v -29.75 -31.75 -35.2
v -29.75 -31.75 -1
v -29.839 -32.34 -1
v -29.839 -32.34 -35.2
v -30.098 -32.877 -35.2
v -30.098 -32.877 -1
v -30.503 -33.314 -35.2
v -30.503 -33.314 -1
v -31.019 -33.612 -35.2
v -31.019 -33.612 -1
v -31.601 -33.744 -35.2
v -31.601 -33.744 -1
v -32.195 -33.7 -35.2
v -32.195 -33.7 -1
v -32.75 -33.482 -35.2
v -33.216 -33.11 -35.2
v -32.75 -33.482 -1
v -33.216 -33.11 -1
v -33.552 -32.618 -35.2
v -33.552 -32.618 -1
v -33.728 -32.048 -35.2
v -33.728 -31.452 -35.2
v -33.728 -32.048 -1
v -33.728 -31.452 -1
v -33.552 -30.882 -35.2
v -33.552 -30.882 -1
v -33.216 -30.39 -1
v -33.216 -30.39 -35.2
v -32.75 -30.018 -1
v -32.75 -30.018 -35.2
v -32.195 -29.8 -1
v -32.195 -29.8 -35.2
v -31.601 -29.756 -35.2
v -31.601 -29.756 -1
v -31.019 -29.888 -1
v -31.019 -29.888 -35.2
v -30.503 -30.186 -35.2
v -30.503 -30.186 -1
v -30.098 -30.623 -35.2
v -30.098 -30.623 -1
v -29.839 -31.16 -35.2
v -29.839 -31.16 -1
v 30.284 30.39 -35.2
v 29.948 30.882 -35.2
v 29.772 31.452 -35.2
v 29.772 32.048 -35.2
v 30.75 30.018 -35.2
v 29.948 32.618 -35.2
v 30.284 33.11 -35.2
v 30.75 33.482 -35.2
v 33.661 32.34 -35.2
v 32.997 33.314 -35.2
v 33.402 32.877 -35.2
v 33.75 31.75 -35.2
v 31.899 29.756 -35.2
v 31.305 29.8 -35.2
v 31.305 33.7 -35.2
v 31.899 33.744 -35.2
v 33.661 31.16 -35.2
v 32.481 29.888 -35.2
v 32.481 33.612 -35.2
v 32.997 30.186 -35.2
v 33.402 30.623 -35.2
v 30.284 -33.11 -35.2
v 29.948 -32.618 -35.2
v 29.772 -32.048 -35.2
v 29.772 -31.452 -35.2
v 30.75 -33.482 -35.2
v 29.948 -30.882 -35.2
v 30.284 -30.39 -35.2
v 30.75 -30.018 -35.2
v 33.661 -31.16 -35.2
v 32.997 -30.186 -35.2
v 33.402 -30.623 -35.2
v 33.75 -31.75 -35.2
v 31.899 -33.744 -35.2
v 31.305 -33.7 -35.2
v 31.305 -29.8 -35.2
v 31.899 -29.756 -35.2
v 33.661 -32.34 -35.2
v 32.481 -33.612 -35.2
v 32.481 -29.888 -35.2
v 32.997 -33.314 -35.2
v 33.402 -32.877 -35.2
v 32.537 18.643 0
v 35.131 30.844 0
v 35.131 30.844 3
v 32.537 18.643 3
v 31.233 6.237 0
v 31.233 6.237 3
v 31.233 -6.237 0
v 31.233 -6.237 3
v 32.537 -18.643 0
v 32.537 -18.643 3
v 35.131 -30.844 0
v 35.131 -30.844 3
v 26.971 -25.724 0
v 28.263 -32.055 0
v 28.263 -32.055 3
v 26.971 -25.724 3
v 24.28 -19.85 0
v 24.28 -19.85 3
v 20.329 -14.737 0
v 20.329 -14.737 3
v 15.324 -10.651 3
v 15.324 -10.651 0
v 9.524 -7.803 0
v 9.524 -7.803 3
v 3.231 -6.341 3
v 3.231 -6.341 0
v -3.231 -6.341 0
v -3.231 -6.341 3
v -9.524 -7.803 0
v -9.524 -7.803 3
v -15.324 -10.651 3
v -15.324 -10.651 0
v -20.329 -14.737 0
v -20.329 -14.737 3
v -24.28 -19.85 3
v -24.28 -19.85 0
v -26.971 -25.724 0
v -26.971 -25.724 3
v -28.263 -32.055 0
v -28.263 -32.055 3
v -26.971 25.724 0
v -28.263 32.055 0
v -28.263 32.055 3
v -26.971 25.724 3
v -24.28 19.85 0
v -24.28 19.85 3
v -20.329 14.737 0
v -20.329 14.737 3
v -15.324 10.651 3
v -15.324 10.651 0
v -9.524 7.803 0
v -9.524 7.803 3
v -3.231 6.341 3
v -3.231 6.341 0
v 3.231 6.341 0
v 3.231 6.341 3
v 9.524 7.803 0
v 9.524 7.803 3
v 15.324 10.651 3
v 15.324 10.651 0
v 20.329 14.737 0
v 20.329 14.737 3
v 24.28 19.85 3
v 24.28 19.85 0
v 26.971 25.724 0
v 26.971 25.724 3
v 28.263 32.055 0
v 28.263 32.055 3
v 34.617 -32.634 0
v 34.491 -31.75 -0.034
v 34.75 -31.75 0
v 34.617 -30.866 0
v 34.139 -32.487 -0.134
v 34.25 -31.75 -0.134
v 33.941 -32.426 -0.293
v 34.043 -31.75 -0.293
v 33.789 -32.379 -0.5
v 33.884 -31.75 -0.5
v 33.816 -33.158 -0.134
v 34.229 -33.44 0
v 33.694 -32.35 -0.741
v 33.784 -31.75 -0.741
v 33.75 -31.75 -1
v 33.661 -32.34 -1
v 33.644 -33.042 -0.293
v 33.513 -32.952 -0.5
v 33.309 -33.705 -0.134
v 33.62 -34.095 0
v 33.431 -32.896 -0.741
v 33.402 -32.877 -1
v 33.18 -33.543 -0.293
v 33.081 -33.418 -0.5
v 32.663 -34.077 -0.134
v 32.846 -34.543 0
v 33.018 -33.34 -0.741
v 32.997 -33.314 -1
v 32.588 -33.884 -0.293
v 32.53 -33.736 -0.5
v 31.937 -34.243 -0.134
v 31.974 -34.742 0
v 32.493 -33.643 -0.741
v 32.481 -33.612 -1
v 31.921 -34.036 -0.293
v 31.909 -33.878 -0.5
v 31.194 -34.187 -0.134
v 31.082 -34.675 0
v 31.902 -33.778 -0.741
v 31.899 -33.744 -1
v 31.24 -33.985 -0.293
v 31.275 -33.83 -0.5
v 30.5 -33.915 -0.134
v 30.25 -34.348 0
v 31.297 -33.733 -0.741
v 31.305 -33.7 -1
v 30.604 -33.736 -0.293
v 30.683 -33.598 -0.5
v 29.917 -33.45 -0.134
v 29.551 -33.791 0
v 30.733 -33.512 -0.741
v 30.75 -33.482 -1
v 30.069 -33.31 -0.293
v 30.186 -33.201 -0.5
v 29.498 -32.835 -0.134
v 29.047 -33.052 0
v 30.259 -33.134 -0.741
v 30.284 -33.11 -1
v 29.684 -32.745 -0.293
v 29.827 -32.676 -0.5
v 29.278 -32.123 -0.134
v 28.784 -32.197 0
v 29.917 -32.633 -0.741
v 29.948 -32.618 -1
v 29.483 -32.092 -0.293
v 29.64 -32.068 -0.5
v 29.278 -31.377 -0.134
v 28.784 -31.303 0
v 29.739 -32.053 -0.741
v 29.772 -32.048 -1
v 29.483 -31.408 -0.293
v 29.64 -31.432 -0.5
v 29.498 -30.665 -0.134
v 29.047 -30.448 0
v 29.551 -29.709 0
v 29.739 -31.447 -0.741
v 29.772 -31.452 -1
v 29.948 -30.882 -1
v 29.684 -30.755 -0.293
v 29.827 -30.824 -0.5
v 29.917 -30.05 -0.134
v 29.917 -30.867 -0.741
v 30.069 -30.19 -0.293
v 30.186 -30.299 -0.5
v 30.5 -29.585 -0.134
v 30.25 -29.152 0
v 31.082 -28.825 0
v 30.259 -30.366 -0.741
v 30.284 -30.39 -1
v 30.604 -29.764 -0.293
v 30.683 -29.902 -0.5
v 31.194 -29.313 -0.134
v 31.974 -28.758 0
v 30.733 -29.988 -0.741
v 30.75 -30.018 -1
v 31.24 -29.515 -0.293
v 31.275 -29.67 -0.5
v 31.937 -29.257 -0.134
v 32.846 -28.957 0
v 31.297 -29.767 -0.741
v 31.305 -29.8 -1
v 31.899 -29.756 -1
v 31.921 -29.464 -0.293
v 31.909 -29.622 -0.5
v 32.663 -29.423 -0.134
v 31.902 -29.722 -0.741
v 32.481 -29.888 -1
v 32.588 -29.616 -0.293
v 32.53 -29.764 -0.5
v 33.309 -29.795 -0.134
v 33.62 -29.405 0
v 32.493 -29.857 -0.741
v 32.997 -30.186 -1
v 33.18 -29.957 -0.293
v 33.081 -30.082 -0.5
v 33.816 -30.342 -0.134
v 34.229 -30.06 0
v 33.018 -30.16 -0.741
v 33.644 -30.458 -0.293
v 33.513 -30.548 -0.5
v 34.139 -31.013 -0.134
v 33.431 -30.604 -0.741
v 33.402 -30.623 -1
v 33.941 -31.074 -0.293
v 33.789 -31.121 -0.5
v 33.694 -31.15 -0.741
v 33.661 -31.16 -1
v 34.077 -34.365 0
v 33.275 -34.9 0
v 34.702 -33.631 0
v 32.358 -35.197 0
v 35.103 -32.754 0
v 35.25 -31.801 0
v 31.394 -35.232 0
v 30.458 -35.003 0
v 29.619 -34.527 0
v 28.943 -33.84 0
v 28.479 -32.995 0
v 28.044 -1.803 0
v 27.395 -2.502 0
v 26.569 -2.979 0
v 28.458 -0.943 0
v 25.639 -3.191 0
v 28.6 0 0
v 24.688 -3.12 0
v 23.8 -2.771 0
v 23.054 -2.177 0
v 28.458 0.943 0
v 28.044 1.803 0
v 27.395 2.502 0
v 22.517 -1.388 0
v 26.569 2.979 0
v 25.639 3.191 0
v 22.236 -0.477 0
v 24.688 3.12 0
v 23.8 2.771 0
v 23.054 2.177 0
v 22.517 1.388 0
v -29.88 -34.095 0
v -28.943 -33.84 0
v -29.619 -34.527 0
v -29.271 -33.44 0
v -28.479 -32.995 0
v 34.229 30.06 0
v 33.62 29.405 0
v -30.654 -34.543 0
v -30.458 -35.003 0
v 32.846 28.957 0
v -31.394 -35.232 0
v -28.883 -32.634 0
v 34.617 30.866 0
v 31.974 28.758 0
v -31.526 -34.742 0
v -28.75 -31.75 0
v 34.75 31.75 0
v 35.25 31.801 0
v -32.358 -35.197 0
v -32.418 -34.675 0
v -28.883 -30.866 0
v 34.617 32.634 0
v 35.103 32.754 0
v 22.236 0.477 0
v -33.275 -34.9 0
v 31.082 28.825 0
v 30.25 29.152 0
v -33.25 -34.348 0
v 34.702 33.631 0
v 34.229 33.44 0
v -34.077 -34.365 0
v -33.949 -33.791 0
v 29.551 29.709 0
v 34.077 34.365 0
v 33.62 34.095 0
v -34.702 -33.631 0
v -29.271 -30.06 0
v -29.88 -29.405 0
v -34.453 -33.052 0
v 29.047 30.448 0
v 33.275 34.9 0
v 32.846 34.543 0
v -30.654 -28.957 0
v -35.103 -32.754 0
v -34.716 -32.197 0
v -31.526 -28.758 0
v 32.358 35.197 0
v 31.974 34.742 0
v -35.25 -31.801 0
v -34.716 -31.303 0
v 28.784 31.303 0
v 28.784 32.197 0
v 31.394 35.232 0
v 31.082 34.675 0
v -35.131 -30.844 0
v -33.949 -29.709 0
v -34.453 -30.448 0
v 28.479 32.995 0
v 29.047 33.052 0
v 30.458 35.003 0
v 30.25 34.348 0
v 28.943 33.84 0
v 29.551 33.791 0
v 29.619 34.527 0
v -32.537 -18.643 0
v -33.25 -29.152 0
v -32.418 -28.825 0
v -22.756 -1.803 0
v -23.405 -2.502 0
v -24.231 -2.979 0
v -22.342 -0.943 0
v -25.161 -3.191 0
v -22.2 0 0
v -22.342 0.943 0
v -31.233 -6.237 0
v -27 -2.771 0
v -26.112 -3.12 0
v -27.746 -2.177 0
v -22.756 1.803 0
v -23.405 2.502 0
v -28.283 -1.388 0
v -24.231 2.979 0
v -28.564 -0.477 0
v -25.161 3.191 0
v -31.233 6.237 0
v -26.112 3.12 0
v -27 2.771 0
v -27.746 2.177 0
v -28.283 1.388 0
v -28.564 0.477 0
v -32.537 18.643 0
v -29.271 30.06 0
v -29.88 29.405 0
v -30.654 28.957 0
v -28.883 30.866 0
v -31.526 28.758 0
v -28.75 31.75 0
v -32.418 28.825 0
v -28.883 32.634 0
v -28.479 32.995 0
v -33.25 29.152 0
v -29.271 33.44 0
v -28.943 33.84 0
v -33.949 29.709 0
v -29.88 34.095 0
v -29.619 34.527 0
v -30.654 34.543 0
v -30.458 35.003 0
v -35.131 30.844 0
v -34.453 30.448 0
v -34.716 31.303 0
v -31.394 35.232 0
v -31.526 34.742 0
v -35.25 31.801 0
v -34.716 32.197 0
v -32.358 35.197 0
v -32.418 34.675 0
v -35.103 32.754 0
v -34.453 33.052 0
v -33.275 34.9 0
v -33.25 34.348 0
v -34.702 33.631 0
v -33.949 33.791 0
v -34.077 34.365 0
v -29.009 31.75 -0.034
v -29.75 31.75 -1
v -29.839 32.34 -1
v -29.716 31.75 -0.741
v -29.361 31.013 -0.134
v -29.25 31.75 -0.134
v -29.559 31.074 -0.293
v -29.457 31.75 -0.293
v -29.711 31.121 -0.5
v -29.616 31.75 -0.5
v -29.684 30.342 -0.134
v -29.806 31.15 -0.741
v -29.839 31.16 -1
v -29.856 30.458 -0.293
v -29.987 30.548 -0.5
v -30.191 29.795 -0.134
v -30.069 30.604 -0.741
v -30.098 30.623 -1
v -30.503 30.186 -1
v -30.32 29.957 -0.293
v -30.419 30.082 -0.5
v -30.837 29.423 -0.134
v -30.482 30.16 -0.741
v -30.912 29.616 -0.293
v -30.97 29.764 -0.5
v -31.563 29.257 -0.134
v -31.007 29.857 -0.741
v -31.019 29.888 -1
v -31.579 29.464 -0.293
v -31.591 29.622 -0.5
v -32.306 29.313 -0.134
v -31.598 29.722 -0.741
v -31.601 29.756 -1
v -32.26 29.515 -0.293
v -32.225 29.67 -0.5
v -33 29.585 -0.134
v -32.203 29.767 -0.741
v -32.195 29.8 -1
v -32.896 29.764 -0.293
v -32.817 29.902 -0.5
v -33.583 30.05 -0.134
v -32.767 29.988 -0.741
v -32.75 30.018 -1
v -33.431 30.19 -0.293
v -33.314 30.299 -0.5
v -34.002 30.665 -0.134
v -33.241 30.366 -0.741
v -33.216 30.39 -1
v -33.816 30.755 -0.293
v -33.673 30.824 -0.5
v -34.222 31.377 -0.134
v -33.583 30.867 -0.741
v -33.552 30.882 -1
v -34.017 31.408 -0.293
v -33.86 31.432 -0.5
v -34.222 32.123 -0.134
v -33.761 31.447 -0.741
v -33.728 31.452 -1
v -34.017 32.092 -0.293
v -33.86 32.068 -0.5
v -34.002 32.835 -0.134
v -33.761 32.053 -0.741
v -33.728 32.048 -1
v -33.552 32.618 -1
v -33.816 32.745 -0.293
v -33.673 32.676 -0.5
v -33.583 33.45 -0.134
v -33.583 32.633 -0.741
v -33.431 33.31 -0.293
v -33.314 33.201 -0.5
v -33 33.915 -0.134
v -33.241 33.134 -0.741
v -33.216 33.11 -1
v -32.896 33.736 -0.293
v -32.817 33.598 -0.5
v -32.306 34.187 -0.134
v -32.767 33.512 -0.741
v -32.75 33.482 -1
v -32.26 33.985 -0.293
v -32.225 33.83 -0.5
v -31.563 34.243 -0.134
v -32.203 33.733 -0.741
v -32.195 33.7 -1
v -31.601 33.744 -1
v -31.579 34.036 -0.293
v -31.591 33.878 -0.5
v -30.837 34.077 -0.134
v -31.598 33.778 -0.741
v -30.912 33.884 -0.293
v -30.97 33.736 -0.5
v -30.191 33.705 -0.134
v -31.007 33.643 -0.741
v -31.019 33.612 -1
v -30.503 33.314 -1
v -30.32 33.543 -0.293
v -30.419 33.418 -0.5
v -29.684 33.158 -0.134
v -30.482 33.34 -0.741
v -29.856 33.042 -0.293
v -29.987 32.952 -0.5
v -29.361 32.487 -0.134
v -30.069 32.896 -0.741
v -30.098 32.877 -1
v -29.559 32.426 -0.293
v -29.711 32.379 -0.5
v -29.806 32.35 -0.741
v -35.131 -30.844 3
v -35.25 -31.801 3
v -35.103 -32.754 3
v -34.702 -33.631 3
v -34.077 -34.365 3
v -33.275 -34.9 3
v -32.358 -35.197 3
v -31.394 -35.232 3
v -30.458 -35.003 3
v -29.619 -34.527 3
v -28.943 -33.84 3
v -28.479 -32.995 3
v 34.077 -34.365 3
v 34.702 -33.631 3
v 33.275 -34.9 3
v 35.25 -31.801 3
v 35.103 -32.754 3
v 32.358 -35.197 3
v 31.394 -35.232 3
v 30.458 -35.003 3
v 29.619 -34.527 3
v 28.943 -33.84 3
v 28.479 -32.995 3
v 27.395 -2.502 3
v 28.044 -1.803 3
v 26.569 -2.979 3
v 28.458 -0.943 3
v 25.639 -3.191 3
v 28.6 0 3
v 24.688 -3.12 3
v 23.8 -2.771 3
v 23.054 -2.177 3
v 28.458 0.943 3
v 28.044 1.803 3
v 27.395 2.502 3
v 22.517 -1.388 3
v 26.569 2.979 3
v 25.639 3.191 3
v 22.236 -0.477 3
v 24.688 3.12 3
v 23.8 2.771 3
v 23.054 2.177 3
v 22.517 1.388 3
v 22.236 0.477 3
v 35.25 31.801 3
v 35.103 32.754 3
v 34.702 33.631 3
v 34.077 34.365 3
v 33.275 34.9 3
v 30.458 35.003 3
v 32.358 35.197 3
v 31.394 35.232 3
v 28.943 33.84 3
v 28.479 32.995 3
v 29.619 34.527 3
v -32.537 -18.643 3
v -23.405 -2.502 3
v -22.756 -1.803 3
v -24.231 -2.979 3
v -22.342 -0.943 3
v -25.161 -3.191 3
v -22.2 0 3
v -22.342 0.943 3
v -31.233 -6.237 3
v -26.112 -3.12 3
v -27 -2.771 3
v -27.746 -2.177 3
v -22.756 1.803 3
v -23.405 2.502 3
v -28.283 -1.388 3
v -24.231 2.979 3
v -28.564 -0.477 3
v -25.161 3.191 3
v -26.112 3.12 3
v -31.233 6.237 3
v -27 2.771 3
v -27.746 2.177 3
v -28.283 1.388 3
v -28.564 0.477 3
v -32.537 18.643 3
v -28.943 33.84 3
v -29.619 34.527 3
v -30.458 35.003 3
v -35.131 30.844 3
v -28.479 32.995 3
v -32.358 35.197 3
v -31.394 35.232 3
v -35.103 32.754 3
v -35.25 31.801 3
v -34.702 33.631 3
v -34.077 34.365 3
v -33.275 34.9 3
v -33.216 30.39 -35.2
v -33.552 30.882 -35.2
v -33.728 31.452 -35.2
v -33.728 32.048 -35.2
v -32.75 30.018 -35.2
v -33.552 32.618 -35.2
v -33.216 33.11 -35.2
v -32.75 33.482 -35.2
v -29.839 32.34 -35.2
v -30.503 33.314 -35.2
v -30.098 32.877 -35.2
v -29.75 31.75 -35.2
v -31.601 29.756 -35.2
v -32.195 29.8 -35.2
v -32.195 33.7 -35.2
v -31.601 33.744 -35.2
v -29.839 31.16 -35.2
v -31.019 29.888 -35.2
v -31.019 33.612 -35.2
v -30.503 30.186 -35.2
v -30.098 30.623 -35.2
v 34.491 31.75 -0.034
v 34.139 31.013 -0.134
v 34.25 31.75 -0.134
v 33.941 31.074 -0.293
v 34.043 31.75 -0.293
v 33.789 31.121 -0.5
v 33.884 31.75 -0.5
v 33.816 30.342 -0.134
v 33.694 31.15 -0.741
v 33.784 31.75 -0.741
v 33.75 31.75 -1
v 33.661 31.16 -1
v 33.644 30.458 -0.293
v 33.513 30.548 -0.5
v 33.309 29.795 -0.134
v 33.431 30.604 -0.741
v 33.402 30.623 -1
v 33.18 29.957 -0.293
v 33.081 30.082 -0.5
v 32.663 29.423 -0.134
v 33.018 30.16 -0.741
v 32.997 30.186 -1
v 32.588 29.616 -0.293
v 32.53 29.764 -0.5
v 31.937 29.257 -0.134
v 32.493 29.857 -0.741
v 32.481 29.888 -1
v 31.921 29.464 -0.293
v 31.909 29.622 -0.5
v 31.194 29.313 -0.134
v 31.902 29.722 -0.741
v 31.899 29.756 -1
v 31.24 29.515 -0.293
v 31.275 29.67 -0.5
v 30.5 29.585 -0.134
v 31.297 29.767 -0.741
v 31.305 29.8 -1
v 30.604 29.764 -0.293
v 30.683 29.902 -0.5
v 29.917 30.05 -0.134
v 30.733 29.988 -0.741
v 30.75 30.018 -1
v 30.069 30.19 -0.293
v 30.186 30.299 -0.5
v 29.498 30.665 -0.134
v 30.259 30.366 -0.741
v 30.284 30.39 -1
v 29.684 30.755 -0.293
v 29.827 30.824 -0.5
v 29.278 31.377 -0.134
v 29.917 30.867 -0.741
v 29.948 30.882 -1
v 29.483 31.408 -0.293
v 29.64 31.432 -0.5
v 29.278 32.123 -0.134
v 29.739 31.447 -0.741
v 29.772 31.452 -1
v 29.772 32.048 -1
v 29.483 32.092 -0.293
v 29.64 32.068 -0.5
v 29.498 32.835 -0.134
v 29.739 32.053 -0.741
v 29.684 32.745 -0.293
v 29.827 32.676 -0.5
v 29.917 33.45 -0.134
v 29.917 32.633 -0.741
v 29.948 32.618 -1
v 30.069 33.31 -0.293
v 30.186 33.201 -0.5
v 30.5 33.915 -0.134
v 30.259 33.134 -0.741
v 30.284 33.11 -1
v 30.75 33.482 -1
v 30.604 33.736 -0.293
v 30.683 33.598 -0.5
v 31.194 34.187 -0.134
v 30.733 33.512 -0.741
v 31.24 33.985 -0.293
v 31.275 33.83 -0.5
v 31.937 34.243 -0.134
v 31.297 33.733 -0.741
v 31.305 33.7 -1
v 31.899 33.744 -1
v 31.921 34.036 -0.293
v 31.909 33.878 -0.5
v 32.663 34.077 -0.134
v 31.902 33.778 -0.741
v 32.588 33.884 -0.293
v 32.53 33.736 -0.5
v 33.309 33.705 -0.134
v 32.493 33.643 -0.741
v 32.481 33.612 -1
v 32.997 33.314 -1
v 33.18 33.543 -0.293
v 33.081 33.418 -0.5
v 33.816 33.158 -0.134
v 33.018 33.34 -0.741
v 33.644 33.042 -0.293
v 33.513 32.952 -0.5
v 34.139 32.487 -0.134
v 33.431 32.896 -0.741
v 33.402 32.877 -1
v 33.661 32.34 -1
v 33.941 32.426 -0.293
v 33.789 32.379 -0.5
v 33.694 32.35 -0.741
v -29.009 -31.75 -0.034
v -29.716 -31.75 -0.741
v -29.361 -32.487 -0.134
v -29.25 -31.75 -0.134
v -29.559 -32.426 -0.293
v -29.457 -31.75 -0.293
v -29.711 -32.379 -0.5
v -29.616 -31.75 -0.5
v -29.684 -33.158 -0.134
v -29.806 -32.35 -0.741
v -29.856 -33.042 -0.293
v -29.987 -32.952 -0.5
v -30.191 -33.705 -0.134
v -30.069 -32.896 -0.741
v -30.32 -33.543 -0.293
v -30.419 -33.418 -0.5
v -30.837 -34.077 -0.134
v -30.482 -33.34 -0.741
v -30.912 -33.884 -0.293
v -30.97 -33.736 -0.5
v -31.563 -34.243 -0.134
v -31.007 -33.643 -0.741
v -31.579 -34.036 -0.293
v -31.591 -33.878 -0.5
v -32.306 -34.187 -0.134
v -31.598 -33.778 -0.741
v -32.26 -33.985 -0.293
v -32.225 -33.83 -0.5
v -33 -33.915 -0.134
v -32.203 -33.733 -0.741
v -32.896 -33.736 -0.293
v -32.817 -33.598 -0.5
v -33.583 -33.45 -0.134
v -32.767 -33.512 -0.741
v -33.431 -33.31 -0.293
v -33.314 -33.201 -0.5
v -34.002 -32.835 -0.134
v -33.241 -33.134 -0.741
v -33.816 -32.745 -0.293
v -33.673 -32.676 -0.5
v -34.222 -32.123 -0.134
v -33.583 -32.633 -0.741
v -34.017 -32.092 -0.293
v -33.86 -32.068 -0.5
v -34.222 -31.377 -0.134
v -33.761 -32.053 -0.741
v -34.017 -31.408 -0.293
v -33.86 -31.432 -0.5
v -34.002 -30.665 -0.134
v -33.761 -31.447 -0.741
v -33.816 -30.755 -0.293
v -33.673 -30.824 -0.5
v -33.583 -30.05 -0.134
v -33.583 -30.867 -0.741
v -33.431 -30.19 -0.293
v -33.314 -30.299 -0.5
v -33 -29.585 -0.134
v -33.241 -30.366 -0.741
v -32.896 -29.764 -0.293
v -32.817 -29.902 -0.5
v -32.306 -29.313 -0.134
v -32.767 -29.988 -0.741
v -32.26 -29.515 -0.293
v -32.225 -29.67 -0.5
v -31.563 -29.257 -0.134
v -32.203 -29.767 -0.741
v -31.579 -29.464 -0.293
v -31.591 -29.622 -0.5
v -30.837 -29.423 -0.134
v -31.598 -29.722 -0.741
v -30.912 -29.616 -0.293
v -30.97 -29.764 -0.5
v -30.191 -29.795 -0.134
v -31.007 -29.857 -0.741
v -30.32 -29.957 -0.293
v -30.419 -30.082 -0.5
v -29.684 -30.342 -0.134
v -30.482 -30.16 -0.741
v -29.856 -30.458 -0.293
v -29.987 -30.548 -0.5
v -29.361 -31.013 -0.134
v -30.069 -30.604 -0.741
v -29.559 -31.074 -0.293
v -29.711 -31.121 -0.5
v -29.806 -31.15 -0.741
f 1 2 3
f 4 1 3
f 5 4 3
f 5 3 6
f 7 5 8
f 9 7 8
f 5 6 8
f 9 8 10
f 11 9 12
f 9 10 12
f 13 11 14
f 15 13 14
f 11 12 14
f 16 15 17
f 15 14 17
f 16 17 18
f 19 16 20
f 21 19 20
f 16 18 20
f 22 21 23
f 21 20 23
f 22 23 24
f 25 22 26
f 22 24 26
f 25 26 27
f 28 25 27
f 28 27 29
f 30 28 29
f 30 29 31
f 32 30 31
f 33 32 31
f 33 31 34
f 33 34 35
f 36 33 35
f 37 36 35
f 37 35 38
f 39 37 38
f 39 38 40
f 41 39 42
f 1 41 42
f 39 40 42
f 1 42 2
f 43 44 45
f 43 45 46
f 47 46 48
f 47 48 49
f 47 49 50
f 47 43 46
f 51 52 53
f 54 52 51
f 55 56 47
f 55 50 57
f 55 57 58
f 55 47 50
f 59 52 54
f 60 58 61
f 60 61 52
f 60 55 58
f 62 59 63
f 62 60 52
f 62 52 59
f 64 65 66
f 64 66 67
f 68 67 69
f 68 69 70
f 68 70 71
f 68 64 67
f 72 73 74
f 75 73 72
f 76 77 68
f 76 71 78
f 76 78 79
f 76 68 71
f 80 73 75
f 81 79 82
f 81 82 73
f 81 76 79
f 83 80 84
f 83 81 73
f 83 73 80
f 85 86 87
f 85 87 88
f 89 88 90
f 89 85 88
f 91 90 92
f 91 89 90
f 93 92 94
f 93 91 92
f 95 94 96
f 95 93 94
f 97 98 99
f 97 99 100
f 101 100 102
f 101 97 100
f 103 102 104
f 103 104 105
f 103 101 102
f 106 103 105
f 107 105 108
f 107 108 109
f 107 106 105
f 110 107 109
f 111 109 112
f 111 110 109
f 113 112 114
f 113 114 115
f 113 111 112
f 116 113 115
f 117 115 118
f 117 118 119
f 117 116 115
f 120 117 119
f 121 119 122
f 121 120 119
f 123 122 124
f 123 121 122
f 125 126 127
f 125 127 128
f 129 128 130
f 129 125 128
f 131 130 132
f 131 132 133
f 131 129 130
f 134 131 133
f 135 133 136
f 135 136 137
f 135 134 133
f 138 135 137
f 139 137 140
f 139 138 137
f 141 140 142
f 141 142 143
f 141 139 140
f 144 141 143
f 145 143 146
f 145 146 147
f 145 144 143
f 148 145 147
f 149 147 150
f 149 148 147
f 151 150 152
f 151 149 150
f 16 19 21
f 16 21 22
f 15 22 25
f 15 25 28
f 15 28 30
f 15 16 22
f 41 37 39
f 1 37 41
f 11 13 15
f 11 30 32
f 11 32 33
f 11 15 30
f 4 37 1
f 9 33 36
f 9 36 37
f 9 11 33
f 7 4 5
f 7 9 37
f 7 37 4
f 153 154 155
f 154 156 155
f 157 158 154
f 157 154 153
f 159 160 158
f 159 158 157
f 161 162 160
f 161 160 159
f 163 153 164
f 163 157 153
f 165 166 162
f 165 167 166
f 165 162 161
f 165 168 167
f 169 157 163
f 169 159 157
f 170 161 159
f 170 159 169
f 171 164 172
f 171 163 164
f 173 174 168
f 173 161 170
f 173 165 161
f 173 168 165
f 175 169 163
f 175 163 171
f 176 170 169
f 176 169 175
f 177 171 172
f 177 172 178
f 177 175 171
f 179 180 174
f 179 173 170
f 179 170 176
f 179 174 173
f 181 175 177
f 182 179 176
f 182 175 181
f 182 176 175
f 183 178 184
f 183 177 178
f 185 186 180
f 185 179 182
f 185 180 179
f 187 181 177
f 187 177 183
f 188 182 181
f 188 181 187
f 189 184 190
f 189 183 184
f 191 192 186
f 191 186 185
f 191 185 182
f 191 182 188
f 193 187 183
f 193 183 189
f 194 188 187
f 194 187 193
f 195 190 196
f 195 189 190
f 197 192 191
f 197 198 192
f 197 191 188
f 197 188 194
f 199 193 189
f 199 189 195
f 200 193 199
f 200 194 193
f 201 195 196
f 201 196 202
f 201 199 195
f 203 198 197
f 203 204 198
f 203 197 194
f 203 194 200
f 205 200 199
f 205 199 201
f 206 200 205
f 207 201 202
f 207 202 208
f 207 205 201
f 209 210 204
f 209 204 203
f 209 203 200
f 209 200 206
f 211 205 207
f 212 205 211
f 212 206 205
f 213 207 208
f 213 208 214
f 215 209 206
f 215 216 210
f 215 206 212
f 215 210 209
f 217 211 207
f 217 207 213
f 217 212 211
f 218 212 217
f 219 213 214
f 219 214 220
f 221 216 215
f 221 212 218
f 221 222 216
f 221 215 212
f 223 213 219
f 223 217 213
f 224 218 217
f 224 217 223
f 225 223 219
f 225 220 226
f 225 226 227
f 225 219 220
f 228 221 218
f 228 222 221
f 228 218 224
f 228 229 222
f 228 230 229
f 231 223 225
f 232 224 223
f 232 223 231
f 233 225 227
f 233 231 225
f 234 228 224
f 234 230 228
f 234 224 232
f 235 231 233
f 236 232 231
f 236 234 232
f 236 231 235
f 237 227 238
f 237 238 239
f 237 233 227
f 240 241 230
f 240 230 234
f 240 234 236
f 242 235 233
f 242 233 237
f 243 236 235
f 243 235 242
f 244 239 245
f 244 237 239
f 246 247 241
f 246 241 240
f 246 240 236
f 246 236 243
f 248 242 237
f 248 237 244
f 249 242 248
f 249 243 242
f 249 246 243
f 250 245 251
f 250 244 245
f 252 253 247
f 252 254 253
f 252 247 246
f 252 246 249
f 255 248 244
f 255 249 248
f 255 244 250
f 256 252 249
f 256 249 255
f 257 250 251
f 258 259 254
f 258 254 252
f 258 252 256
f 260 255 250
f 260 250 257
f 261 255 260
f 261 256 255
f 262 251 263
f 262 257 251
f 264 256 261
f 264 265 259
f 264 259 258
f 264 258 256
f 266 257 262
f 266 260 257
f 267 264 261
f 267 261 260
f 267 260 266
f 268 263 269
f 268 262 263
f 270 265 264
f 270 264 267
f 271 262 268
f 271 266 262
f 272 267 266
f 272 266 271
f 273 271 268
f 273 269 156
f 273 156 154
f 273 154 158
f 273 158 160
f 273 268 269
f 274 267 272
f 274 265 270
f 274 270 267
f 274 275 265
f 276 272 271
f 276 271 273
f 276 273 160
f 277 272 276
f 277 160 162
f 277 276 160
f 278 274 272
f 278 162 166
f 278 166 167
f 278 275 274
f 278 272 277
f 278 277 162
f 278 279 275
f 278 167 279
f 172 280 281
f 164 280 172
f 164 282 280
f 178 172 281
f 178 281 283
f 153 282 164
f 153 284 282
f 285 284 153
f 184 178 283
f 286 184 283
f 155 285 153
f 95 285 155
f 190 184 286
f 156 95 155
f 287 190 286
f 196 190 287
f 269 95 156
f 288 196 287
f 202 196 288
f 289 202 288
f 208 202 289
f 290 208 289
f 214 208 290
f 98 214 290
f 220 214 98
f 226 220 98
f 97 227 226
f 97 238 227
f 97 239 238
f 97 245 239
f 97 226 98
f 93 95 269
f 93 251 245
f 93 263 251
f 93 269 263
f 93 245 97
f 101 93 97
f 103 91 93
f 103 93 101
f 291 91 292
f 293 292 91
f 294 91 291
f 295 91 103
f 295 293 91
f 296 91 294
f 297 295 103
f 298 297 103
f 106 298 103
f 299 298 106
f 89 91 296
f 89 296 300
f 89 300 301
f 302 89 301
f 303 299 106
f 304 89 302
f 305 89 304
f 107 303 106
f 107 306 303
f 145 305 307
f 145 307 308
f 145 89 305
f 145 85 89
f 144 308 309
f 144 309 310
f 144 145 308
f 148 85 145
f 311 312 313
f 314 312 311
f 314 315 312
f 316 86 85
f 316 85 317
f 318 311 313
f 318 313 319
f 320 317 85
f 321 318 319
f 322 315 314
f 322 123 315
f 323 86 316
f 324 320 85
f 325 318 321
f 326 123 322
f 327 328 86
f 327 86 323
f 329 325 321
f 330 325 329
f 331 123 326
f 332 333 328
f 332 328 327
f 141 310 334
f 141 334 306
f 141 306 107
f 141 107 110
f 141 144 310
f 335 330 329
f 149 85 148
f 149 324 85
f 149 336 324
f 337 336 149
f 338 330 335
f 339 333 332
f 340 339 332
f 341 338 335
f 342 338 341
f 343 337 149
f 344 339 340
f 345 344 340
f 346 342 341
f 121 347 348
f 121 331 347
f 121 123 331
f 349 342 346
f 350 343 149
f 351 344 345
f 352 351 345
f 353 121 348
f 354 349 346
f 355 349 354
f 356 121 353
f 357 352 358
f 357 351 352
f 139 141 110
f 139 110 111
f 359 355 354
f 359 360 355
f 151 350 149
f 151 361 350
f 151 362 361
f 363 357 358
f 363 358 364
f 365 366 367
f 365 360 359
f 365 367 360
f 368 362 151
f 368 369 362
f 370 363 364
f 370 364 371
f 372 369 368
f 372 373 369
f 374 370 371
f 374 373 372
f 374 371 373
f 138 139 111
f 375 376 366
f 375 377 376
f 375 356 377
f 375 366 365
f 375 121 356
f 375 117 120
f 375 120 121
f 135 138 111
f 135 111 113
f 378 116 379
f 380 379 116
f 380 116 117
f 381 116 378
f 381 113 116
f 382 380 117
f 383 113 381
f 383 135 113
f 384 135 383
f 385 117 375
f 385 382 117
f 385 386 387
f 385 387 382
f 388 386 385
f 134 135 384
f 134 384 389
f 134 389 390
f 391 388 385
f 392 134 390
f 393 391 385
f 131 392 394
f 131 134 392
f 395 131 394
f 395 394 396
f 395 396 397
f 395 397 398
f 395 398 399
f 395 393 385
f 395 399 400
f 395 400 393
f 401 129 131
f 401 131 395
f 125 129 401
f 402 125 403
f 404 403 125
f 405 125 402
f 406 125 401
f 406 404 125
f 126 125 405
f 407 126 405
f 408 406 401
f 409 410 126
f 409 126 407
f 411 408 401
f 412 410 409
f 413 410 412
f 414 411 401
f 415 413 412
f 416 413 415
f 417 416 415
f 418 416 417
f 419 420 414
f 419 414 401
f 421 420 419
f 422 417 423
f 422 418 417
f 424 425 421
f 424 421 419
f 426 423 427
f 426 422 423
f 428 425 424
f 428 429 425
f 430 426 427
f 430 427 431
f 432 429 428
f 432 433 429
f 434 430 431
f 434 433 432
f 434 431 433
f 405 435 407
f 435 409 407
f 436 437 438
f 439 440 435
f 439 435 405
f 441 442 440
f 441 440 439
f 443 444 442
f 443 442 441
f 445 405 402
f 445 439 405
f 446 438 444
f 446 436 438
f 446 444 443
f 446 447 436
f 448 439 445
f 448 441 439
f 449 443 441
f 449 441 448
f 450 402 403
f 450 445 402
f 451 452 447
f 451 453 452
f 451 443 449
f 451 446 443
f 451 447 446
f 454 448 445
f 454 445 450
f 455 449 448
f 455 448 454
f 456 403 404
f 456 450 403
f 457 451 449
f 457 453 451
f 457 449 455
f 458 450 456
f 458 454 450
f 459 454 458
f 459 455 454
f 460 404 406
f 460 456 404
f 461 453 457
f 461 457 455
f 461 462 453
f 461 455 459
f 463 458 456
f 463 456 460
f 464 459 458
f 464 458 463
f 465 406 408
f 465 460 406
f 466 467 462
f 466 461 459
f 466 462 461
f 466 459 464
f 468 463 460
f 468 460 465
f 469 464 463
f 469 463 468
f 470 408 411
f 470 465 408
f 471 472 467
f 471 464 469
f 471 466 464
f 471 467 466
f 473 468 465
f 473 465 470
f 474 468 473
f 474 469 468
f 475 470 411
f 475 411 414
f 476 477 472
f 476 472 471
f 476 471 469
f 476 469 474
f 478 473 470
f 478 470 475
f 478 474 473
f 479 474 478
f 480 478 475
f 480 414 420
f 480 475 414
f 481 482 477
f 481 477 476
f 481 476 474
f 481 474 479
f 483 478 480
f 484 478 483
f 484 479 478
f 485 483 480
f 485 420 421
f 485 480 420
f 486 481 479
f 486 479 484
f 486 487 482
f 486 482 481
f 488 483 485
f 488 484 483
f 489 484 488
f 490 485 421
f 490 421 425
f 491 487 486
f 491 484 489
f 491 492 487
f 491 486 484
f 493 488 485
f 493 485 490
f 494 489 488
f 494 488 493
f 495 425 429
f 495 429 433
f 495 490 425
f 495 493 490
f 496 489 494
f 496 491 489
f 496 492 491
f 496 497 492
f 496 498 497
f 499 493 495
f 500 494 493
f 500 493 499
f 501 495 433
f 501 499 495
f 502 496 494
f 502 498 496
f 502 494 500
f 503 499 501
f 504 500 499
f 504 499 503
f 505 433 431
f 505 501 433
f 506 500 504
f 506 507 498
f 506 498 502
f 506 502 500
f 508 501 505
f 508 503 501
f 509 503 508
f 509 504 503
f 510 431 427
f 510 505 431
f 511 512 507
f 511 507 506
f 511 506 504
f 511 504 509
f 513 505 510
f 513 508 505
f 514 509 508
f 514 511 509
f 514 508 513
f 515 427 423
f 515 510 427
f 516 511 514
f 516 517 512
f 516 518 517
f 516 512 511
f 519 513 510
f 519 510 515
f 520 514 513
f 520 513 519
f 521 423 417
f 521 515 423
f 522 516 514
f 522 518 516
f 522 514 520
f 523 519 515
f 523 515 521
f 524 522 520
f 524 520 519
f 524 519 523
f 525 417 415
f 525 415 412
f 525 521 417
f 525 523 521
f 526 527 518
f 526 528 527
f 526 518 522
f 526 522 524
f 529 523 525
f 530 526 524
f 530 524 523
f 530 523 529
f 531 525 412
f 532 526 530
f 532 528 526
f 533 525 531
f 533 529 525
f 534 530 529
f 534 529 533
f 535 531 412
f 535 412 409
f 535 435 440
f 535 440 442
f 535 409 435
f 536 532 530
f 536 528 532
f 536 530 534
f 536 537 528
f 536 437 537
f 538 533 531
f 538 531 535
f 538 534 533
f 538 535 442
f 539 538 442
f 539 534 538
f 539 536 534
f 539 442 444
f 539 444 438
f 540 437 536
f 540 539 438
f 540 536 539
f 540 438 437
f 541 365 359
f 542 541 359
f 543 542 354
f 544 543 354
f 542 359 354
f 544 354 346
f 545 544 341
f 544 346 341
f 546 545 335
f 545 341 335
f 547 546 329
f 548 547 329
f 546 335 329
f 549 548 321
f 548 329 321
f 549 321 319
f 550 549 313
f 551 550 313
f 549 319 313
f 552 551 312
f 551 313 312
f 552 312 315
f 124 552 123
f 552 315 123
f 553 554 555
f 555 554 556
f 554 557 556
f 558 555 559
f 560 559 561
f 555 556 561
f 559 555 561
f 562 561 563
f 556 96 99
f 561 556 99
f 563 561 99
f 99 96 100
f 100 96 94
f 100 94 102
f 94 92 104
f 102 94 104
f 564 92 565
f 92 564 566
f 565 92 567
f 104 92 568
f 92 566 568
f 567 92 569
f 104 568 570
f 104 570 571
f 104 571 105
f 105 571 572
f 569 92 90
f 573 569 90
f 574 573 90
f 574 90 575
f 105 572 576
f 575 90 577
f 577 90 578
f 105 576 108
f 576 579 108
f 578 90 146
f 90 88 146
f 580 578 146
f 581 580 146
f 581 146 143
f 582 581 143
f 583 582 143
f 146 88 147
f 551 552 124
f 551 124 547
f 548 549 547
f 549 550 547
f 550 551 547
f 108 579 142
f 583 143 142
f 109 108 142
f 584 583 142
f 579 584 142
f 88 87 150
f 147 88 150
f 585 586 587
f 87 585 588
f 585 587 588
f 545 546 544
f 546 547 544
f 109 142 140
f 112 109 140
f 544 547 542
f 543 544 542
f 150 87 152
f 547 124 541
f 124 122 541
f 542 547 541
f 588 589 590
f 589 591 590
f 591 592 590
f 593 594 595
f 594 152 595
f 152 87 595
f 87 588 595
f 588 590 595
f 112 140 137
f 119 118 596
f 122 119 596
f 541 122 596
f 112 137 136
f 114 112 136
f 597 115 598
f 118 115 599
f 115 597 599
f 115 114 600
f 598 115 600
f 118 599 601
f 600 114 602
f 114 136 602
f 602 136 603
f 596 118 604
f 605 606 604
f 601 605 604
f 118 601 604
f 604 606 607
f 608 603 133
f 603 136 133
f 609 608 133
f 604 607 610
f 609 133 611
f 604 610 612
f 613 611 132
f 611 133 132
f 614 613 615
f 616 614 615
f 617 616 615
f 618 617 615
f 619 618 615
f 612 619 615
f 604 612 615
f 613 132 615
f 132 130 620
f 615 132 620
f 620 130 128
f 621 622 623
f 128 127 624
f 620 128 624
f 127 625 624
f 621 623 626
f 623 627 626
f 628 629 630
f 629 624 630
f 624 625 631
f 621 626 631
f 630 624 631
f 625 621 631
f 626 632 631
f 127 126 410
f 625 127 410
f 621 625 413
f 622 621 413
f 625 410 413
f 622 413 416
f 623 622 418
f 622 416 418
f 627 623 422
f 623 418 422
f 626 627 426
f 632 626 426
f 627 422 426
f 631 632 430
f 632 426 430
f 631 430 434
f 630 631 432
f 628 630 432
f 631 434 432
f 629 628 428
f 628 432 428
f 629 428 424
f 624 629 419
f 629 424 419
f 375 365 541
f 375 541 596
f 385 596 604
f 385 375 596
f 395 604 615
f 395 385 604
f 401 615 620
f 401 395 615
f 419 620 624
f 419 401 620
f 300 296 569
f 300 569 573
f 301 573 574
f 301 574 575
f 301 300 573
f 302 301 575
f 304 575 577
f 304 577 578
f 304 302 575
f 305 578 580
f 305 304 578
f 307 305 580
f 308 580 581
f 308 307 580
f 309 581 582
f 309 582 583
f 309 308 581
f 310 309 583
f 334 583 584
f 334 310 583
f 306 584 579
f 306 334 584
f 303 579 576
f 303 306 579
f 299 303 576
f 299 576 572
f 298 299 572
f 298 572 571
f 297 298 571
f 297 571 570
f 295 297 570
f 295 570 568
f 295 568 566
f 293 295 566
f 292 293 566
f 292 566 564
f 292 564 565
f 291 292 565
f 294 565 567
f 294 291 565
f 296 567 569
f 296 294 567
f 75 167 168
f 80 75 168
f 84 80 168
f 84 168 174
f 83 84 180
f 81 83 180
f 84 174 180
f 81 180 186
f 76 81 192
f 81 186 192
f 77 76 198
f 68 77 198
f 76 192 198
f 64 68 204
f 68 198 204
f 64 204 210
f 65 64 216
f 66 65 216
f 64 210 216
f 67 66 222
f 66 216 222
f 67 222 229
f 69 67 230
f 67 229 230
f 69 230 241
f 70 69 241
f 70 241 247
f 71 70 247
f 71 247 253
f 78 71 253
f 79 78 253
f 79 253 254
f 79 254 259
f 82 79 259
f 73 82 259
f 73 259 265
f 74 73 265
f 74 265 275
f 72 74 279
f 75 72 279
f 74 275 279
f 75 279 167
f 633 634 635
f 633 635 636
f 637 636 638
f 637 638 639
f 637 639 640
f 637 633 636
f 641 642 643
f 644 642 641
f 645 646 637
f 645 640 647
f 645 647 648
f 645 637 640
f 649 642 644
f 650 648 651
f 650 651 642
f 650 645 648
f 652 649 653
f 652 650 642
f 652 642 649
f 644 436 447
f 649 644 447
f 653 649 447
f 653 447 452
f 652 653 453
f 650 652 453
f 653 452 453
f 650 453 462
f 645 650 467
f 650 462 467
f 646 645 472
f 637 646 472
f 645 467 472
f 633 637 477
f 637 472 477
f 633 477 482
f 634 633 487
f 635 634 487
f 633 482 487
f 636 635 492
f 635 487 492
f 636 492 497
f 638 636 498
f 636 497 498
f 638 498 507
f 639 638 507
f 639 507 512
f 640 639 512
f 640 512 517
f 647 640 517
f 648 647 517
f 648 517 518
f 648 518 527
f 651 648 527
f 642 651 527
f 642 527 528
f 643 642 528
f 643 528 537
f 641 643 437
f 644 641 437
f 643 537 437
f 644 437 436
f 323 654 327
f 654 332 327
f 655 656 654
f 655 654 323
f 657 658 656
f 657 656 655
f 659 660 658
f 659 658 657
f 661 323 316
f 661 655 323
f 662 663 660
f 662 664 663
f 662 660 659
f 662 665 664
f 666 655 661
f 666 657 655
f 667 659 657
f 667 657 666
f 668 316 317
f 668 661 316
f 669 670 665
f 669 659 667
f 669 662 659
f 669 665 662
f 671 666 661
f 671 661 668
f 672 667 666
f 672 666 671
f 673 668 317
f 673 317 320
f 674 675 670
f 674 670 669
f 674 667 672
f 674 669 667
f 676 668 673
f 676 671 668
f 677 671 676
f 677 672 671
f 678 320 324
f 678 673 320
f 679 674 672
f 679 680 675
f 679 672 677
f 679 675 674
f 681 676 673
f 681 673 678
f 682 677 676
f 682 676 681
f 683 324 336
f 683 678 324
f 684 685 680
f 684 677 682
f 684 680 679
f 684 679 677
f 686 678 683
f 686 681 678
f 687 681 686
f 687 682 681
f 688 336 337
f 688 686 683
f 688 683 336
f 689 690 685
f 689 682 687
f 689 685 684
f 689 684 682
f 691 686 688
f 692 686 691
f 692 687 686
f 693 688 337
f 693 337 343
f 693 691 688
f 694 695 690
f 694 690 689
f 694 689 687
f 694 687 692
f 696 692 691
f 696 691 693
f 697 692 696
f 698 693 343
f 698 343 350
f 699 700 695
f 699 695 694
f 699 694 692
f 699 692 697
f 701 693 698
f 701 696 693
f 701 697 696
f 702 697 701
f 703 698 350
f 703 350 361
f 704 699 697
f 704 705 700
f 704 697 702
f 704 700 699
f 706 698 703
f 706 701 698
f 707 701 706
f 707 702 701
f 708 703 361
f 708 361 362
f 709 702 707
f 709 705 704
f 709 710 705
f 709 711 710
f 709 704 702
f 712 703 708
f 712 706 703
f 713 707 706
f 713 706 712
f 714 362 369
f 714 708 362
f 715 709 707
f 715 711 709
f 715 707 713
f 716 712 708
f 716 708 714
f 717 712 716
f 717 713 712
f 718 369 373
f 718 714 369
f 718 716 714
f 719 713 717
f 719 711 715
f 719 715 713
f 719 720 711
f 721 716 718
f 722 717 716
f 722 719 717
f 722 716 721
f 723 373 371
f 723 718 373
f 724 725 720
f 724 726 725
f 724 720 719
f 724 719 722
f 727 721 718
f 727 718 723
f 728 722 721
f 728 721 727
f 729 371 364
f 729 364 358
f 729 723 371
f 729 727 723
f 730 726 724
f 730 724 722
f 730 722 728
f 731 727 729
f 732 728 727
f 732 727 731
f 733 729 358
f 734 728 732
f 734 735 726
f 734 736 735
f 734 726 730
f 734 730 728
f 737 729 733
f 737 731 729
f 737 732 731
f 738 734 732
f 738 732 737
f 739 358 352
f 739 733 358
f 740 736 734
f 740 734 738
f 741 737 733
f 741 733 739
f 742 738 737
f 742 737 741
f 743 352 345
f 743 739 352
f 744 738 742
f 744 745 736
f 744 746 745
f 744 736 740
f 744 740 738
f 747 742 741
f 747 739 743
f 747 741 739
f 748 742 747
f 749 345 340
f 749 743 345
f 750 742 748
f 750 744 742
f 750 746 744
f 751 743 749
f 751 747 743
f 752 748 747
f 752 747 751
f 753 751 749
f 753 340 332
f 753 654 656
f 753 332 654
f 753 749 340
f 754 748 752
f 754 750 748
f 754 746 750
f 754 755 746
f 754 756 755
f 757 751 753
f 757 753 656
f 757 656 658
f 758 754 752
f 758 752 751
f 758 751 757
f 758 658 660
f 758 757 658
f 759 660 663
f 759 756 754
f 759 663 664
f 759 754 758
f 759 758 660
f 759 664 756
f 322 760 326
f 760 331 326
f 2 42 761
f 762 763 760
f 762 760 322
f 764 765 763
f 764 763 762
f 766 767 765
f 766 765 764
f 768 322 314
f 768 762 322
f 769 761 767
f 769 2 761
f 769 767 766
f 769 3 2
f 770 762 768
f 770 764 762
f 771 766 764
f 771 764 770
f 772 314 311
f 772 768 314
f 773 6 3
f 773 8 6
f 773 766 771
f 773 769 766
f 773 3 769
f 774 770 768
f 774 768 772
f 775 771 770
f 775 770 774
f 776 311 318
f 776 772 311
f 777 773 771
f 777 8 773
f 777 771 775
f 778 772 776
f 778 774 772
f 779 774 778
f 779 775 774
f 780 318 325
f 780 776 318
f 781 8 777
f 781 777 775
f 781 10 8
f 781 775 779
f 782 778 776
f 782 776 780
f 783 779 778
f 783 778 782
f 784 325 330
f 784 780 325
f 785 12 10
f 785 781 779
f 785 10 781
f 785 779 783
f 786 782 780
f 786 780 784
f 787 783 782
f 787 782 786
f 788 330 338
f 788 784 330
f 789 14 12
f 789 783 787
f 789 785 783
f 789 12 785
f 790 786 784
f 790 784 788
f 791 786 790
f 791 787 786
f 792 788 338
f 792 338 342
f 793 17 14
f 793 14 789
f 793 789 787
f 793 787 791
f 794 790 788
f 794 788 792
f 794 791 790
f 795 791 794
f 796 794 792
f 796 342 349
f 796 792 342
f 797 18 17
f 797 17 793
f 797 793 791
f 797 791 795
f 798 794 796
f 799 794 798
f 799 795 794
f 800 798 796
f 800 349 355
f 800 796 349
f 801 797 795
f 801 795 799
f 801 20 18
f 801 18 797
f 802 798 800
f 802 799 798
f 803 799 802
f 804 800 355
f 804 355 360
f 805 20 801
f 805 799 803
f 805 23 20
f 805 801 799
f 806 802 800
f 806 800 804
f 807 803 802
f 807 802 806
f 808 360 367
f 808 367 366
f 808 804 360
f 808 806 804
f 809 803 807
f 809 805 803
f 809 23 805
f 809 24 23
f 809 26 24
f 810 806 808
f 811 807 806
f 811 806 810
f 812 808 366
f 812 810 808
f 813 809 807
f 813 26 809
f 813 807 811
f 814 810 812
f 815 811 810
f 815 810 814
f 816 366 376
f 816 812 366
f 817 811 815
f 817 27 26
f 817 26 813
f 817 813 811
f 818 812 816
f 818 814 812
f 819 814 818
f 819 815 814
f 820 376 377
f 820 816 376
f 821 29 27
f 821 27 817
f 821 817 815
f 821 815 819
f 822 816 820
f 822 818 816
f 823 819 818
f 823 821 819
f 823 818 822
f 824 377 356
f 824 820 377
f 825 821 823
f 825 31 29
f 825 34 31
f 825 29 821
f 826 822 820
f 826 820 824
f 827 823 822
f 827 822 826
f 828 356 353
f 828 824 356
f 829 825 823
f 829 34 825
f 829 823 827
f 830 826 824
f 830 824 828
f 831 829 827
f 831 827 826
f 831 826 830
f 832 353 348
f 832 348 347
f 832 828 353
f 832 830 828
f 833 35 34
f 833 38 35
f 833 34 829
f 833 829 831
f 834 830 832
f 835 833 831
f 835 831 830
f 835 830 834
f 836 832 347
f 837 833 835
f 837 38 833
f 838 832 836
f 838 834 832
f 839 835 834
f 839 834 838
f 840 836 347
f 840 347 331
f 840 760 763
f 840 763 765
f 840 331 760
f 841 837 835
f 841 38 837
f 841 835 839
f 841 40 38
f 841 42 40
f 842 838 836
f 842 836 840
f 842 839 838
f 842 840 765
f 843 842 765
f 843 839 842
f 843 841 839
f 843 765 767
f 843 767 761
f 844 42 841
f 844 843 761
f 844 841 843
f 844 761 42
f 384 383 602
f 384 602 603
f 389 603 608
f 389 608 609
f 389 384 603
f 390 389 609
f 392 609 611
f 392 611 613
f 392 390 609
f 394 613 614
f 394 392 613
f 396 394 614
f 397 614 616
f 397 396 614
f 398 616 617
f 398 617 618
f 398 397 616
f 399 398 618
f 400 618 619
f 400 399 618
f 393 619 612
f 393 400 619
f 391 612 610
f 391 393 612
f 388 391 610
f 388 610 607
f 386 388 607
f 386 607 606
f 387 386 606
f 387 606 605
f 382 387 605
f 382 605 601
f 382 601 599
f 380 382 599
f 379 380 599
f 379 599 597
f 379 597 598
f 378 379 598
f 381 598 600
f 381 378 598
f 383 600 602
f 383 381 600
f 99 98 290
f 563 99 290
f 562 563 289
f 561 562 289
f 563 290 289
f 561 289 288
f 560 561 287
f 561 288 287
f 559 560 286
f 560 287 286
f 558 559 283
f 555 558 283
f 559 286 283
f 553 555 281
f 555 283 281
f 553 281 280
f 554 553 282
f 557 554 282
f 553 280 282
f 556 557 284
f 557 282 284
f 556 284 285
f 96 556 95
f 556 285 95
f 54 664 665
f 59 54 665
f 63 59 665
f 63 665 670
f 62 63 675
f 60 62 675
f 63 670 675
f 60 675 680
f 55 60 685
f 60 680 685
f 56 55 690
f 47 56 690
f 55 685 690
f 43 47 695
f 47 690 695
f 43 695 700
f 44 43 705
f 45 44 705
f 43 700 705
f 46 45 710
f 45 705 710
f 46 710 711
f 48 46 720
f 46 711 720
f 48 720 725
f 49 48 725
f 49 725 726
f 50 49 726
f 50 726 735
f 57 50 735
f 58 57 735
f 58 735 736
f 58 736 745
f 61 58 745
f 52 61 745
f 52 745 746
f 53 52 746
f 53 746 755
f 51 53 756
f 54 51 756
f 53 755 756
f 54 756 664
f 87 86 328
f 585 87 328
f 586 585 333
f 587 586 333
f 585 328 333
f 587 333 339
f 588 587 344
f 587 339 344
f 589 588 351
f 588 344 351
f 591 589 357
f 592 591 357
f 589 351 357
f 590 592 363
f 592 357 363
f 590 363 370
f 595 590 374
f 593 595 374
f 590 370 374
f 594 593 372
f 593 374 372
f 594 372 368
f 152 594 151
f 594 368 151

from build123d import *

# Parameters (mm, degrees)
SKETCH_R     = 3.2
PAD_DEPTH    = 3
SKETCH001_R  = 2
PAD001_DEPTH = 35.2
FILLET_R     = 1


with BuildPart() as part:
    # Sketch → Pad (new body)
    with BuildSketch(Plane.XY):
        with BuildLine():
            ThreePointArc((-28.263319, 32.055045), (0, 6.156485), (28.263319, 32.055045))
            ThreePointArc((35.13074, 30.844133), (32.357769, 35.196827), (28.263319, 32.055045))
            ThreePointArc((35.13074, 30.844133), (31.070033, 0), (35.13074, -30.844133))
            ThreePointArc((28.263319, -32.055045), (32.357769, -35.196827), (35.13074, -30.844133))
            ThreePointArc((28.263319, -32.055045), (0, -6.156485), (-28.263319, -32.055045))
            ThreePointArc((-35.13074, -30.844133), (-32.357769, -35.196827), (-28.263319, -32.055045))
            ThreePointArc((-35.13074, -30.844133), (-31.070033, 0), (-35.13074, 30.844133))
            ThreePointArc((-28.263319, 32.055045), (-32.357769, 35.196827), (-35.13074, 30.844133))
        make_face()
        with Locations((-25.4, 0)):
            Circle(SKETCH_R, mode=Mode.SUBTRACT)
        with Locations((25.4, 0)):
            Circle(SKETCH_R, mode=Mode.SUBTRACT)
    extrude(amount=PAD_DEPTH)

    # Sketch001 → Pad001 (join)
    with BuildSketch(Plane(origin=(0, 0, 0), x_dir=(1, 0, 0), z_dir=(0, 0, -1))):
        with Locations((-31.75, 31.75)):
            Circle(SKETCH001_R)
        with Locations((31.75, 31.75)):
            Circle(SKETCH001_R)
        with Locations((-31.75, -31.75)):
            Circle(SKETCH001_R)
        with Locations((31.75, -31.75)):
            Circle(SKETCH001_R)
    extrude(amount=PAD001_DEPTH)

    # Fillet
    fillet_edges = [part.edges().sort_by_distance(p)[0] for p in [
        (29.75, 31.75, 0),
        (29.75, -31.75, 0),
        (-33.75, 31.75, 0),
        (-33.75, -31.75, 0),
    ]]
    fillet(fillet_edges, radius=FILLET_R)


solid = part.part
